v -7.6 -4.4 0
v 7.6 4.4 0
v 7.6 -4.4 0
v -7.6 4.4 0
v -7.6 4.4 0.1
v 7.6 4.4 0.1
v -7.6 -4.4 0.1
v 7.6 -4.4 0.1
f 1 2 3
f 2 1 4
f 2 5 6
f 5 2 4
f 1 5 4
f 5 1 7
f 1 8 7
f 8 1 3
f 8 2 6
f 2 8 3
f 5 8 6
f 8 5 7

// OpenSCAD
// file: ../p/box5-12.scad
use <../lib.scad>
function ldraw_lib__box5_12() = [
// 0 Box with 5 Faces without Any Edges
// 0 Name: box5-12.dat
// 0 Author: Chris Dee [cwdee]
// 0 !LDRAW_ORG Primitive UPDATE 2009-02
// 0 !LICENSE Licensed under CC BY 4.0 : see CAreadme.txt
// 
// 0 BFC CERTIFY CCW
  [0,"BFC","CERTIFY"],
  [0,"BFC","CCW"],
// 
// 0 !HISTORY 2009-09-03 [PTadmin] Official Update 2009-02
// 
// 
// 4 16 1 1 1 1 1 -1 -1 1 -1 -1 1 1
  [4,16,1,1,1,1,1,-1,-1,1,-1,-1,1,1],
// 4 16 -1 0 1 1 0 1 1 1 1 -1 1 1
  [4,16,-1,0,1,1,0,1,1,1,1,-1,1,1],
// 4 16 -1 0 -1 -1 0 1 -1 1 1 -1 1 -1
  [4,16,-1,0,-1,-1,0,1,-1,1,1,-1,1,-1],
// 4 16 1 0 -1 -1 0 -1 -1 1 -1 1 1 -1
  [4,16,1,0,-1,-1,0,-1,-1,1,-1,1,1,-1],
// 4 16 1 0 1 1 0 -1 1 1 -1 1 1 1
  [4,16,1,0,1,1,0,-1,1,1,-1,1,1,1],
// 0
];
module ldraw_lib__box5_12(step=0, col=false, unit=2/5, alt=false, line=0.2, solid=!$preview)
    makepoly(ldraw_lib__box5_12(), step=step, col=col, unit=unit, alt=alt, line=line, solid=solid);
ldraw_lib__box5_12(line=0.2);
// main file
use <../lib.scad>
use <../p/box5-12.scad>
function ldraw_lib__162275g() = [
// 0 Sticker  1.1 x  1.9 with White Rectangle
// 0 Name: 162275g.dat
// 0 Author: Takeshi Takahashi [RainbowDolphin]
// 0 !LDRAW_ORG Part UPDATE 2023-03
// 0 !LICENSE Licensed under CC BY 4.0 : see CAreadme.txt
// 
// 0 BFC CERTIFY CCW
  [0,"BFC","CERTIFY"],
  [0,"BFC","CCW"],
// 
// 0 !KEYWORDS Bricklink 5550stk01, Brickowl 321461, Custom Rally Van, Model Team
// 0 !KEYWORDS Rebrickable 162275, Set 5550, truck
// 
// 0 !HISTORY 2023-06-24 [OrionP] Official Update 2023-03
// 
// 
// 1 16 0 -0.25 0 19 0 0 0 0.25 0 0 0 11 box5-12.dat
  [1,16,0,-0.25,0,19,0,0,0,0.25,0,0,0,11, ldraw_lib__box5_12()],
// 0 BFC NOCLIP
  [0,"BFC","NOCLIP"],
// 4 15 19 -0.25 11 -19 -0.25 11 -19 -0.25 -11 19 -0.25 -11
  [4,15,19,-0.25,11,-19,-0.25,11,-19,-0.25,-11,19,-0.25,-11],
];
module ldraw_lib__162275g(step=0, col=false, unit=2/5, alt=false, line=0.2, solid=!$preview)
    makepoly(ldraw_lib__162275g(), step=step, col=col, unit=unit, alt=alt, line=line, solid=solid);
ldraw_lib__162275g(line=0.2);
